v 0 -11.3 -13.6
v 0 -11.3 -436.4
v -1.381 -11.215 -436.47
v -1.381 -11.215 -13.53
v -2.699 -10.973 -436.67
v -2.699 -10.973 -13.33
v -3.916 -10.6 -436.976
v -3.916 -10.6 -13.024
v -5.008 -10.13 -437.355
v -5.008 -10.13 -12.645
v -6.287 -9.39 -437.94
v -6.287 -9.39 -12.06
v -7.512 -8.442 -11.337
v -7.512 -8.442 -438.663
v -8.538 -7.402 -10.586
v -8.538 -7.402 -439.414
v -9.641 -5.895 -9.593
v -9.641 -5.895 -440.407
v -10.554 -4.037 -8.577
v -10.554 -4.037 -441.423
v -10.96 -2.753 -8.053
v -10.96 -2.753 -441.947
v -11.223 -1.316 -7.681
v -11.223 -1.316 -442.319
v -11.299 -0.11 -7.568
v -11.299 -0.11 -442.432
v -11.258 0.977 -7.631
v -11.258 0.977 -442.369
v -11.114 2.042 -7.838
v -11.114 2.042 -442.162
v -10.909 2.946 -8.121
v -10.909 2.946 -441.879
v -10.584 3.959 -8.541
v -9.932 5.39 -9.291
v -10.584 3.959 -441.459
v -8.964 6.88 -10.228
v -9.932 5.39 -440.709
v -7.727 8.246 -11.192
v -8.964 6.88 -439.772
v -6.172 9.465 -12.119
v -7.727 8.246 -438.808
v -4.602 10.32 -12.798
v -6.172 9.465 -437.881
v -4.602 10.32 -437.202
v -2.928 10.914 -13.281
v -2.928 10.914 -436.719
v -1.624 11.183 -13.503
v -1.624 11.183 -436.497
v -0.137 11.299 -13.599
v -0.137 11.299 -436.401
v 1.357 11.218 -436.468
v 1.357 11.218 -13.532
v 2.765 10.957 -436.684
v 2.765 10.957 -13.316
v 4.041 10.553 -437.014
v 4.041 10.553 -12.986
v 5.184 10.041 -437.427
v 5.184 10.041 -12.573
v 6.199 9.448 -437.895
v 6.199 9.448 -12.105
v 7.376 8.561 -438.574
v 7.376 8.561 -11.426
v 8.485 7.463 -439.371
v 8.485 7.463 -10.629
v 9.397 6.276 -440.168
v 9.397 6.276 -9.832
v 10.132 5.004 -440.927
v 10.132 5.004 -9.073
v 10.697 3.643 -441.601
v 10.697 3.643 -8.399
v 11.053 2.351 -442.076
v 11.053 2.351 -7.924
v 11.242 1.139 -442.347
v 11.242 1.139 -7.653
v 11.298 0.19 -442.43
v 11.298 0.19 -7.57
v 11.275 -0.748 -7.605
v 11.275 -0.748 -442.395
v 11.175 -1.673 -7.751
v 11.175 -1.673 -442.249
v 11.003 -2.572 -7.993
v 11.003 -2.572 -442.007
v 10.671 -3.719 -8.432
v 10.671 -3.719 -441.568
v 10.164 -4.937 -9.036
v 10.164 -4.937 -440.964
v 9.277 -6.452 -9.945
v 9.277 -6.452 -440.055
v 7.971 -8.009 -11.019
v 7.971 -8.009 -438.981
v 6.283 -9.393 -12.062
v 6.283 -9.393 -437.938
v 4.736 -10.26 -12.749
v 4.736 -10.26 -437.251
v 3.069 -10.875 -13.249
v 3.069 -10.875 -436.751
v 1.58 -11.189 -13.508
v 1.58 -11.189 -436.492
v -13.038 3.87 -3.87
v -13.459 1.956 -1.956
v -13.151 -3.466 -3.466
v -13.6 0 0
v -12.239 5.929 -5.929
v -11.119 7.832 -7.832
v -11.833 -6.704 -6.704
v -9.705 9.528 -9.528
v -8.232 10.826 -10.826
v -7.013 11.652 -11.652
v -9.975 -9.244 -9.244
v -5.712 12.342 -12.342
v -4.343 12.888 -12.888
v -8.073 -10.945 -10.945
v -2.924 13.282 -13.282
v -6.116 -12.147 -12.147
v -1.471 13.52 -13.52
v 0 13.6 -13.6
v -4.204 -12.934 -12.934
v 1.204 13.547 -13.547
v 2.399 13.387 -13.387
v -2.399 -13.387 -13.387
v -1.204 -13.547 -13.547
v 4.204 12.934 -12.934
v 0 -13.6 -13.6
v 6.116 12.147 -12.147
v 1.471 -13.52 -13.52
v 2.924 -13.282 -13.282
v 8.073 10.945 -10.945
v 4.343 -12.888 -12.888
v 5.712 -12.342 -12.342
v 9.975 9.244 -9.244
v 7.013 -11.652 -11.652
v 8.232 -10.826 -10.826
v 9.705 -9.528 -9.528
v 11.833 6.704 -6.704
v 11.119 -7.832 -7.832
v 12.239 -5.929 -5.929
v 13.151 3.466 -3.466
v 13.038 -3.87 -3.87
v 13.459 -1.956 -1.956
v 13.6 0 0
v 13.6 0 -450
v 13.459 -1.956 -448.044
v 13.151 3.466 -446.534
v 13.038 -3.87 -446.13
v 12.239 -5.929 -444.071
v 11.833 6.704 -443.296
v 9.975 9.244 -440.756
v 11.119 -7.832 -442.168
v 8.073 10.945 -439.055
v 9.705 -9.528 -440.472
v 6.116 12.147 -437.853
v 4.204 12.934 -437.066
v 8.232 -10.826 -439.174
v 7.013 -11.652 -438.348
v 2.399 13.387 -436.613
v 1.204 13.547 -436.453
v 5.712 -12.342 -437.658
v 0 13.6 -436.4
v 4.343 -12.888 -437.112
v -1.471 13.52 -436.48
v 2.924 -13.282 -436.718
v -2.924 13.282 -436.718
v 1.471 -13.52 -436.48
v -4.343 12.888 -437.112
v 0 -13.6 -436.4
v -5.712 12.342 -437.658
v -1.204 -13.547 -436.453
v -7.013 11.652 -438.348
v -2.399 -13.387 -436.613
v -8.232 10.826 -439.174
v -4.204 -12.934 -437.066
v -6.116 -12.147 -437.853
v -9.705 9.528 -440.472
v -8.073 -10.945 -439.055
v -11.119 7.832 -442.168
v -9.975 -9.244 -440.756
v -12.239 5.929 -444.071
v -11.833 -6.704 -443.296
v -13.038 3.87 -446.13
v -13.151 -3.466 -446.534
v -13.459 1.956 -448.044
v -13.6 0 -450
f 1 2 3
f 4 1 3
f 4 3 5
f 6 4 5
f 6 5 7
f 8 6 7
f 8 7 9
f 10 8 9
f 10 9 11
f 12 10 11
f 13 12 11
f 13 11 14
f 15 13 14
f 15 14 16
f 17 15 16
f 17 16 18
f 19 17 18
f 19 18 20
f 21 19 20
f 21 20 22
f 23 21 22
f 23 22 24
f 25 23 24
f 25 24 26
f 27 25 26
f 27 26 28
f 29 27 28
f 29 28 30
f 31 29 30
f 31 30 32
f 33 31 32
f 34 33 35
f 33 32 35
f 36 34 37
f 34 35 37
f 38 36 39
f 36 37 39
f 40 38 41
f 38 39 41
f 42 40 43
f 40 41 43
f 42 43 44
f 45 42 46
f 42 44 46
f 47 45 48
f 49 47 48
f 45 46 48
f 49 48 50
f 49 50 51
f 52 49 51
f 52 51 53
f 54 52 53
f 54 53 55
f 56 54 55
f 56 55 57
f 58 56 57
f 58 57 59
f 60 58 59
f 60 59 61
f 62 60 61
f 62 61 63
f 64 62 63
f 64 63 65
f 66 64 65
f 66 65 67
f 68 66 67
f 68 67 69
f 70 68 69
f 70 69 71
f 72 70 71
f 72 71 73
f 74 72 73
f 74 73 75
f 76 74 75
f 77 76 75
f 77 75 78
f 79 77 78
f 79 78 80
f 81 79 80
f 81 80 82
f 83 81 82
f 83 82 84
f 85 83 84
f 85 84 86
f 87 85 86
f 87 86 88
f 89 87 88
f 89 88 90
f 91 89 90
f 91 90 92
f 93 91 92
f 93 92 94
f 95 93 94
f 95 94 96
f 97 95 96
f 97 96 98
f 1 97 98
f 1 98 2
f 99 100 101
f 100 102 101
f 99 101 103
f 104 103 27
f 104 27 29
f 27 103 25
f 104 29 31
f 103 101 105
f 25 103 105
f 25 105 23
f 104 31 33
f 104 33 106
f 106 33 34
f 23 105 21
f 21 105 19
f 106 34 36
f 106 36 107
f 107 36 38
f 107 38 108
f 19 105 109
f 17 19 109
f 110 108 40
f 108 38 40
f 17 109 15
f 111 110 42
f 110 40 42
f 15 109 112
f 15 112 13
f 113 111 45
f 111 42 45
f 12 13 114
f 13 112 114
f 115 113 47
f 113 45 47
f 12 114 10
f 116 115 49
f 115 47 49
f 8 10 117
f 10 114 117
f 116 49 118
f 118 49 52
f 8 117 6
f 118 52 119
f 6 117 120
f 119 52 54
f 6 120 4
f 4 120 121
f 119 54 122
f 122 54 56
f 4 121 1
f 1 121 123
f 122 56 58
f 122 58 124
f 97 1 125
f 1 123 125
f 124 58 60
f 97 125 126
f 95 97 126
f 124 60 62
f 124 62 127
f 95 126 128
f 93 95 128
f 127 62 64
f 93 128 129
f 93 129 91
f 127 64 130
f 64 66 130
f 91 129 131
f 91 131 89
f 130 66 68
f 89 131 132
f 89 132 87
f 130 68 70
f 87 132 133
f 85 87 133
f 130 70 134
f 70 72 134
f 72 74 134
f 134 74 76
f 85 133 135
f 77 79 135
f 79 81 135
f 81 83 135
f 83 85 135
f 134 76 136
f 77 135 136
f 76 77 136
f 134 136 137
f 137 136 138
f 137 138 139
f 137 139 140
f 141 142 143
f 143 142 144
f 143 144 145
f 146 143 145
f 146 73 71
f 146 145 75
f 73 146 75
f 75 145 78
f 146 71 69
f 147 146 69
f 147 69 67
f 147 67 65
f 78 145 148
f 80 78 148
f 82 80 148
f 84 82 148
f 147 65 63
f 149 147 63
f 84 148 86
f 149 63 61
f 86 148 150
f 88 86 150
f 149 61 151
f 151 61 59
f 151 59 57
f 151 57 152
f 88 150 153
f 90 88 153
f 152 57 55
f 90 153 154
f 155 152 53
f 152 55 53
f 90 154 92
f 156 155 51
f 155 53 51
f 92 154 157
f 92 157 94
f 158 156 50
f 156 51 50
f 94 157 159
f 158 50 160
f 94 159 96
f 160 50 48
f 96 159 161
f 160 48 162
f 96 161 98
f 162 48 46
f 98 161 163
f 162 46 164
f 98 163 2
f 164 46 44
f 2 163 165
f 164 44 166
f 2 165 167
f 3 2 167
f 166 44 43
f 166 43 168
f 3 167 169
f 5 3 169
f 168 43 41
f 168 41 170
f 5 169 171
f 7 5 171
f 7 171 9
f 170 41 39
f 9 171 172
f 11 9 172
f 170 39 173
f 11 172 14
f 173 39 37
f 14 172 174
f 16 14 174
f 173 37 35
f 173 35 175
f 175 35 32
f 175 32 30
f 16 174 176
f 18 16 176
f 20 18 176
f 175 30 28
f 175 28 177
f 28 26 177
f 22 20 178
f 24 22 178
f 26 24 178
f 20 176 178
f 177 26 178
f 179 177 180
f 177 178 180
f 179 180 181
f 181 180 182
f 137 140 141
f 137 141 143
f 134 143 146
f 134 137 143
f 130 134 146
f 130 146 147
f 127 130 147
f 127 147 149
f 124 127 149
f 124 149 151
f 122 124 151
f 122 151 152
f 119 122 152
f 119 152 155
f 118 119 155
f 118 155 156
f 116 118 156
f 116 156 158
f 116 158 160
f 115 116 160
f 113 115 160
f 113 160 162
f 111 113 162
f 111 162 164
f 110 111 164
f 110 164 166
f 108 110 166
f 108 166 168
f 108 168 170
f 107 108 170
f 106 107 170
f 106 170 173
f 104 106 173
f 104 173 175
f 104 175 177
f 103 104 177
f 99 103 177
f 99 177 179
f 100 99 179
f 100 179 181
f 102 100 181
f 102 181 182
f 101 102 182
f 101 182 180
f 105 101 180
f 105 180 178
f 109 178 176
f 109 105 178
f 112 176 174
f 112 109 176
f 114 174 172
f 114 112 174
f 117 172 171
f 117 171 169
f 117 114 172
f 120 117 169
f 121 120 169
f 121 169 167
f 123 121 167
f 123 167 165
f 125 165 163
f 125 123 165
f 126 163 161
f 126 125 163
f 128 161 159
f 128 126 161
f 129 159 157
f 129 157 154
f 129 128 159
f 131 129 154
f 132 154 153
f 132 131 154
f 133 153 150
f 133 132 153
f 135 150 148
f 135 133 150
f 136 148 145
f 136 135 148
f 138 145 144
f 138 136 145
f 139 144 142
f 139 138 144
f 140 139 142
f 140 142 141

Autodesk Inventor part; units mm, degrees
ref_plane "YZ Plane" through (0, 0, 0) normal (1, 0, 0) x (0, 1, 0)
ref_plane "XY Plane" through (0, 0, 0) normal (0, 0, 1) x (1, 0, 0)
sketch "スケッチ1" plane through (0, 0, 0) normal (0, 0, 1) x (1, 0, 0)
  circle A0 centre (0, 0) radius 13.6
  dimension "d0" = 27.2
extrude "押し出し1" add sketch "スケッチ1" against normal blind 450
sketch "スケッチ3" plane through (0, 0, 0) normal (0, 0, 1) x (1, 0, 0)
  circle A0 centre (0, 0) radius 13.6 projected
hole "穴1" at (0, 0, 0) direction (0, 0, -1) diameter 22.6 end through all
ref_plane "作業平面1" through (0, 0, 0) normal (0, 1, 0) x (-1, 0, 0)
sketch "スケッチ4" plane through (0, 0, 0) normal (0, 1, 0) x (-1, 0, 0)
  line L0 (-13.6, 0) -> (13.6, 0) projected
  arc A0 (-13.6, 0) -> (13.6, 0) centre (0, 0) ccw
  line L1 (13.6, 0) -> (-13.6, 0)
extrude "押し出し3" cut sketch "スケッチ4" along normal mid plane 27.2
sketch "スケッチ5" plane through (0, 0, 0) normal (0, 1, 0) x (-1, 0, 0)
  line L0 (-13.6, -450) -> (13.6, -450) projected
  arc A0 (13.6, -450) -> (-13.6, -450) centre (0, -450) ccw
  line L1 (-13.6, -450) -> (13.6, -450)
  point P0 (0, 0)
extrude "押し出し4" cut sketch "スケッチ5" along normal mid plane 27.2
properties part number "縦のパイプ"
